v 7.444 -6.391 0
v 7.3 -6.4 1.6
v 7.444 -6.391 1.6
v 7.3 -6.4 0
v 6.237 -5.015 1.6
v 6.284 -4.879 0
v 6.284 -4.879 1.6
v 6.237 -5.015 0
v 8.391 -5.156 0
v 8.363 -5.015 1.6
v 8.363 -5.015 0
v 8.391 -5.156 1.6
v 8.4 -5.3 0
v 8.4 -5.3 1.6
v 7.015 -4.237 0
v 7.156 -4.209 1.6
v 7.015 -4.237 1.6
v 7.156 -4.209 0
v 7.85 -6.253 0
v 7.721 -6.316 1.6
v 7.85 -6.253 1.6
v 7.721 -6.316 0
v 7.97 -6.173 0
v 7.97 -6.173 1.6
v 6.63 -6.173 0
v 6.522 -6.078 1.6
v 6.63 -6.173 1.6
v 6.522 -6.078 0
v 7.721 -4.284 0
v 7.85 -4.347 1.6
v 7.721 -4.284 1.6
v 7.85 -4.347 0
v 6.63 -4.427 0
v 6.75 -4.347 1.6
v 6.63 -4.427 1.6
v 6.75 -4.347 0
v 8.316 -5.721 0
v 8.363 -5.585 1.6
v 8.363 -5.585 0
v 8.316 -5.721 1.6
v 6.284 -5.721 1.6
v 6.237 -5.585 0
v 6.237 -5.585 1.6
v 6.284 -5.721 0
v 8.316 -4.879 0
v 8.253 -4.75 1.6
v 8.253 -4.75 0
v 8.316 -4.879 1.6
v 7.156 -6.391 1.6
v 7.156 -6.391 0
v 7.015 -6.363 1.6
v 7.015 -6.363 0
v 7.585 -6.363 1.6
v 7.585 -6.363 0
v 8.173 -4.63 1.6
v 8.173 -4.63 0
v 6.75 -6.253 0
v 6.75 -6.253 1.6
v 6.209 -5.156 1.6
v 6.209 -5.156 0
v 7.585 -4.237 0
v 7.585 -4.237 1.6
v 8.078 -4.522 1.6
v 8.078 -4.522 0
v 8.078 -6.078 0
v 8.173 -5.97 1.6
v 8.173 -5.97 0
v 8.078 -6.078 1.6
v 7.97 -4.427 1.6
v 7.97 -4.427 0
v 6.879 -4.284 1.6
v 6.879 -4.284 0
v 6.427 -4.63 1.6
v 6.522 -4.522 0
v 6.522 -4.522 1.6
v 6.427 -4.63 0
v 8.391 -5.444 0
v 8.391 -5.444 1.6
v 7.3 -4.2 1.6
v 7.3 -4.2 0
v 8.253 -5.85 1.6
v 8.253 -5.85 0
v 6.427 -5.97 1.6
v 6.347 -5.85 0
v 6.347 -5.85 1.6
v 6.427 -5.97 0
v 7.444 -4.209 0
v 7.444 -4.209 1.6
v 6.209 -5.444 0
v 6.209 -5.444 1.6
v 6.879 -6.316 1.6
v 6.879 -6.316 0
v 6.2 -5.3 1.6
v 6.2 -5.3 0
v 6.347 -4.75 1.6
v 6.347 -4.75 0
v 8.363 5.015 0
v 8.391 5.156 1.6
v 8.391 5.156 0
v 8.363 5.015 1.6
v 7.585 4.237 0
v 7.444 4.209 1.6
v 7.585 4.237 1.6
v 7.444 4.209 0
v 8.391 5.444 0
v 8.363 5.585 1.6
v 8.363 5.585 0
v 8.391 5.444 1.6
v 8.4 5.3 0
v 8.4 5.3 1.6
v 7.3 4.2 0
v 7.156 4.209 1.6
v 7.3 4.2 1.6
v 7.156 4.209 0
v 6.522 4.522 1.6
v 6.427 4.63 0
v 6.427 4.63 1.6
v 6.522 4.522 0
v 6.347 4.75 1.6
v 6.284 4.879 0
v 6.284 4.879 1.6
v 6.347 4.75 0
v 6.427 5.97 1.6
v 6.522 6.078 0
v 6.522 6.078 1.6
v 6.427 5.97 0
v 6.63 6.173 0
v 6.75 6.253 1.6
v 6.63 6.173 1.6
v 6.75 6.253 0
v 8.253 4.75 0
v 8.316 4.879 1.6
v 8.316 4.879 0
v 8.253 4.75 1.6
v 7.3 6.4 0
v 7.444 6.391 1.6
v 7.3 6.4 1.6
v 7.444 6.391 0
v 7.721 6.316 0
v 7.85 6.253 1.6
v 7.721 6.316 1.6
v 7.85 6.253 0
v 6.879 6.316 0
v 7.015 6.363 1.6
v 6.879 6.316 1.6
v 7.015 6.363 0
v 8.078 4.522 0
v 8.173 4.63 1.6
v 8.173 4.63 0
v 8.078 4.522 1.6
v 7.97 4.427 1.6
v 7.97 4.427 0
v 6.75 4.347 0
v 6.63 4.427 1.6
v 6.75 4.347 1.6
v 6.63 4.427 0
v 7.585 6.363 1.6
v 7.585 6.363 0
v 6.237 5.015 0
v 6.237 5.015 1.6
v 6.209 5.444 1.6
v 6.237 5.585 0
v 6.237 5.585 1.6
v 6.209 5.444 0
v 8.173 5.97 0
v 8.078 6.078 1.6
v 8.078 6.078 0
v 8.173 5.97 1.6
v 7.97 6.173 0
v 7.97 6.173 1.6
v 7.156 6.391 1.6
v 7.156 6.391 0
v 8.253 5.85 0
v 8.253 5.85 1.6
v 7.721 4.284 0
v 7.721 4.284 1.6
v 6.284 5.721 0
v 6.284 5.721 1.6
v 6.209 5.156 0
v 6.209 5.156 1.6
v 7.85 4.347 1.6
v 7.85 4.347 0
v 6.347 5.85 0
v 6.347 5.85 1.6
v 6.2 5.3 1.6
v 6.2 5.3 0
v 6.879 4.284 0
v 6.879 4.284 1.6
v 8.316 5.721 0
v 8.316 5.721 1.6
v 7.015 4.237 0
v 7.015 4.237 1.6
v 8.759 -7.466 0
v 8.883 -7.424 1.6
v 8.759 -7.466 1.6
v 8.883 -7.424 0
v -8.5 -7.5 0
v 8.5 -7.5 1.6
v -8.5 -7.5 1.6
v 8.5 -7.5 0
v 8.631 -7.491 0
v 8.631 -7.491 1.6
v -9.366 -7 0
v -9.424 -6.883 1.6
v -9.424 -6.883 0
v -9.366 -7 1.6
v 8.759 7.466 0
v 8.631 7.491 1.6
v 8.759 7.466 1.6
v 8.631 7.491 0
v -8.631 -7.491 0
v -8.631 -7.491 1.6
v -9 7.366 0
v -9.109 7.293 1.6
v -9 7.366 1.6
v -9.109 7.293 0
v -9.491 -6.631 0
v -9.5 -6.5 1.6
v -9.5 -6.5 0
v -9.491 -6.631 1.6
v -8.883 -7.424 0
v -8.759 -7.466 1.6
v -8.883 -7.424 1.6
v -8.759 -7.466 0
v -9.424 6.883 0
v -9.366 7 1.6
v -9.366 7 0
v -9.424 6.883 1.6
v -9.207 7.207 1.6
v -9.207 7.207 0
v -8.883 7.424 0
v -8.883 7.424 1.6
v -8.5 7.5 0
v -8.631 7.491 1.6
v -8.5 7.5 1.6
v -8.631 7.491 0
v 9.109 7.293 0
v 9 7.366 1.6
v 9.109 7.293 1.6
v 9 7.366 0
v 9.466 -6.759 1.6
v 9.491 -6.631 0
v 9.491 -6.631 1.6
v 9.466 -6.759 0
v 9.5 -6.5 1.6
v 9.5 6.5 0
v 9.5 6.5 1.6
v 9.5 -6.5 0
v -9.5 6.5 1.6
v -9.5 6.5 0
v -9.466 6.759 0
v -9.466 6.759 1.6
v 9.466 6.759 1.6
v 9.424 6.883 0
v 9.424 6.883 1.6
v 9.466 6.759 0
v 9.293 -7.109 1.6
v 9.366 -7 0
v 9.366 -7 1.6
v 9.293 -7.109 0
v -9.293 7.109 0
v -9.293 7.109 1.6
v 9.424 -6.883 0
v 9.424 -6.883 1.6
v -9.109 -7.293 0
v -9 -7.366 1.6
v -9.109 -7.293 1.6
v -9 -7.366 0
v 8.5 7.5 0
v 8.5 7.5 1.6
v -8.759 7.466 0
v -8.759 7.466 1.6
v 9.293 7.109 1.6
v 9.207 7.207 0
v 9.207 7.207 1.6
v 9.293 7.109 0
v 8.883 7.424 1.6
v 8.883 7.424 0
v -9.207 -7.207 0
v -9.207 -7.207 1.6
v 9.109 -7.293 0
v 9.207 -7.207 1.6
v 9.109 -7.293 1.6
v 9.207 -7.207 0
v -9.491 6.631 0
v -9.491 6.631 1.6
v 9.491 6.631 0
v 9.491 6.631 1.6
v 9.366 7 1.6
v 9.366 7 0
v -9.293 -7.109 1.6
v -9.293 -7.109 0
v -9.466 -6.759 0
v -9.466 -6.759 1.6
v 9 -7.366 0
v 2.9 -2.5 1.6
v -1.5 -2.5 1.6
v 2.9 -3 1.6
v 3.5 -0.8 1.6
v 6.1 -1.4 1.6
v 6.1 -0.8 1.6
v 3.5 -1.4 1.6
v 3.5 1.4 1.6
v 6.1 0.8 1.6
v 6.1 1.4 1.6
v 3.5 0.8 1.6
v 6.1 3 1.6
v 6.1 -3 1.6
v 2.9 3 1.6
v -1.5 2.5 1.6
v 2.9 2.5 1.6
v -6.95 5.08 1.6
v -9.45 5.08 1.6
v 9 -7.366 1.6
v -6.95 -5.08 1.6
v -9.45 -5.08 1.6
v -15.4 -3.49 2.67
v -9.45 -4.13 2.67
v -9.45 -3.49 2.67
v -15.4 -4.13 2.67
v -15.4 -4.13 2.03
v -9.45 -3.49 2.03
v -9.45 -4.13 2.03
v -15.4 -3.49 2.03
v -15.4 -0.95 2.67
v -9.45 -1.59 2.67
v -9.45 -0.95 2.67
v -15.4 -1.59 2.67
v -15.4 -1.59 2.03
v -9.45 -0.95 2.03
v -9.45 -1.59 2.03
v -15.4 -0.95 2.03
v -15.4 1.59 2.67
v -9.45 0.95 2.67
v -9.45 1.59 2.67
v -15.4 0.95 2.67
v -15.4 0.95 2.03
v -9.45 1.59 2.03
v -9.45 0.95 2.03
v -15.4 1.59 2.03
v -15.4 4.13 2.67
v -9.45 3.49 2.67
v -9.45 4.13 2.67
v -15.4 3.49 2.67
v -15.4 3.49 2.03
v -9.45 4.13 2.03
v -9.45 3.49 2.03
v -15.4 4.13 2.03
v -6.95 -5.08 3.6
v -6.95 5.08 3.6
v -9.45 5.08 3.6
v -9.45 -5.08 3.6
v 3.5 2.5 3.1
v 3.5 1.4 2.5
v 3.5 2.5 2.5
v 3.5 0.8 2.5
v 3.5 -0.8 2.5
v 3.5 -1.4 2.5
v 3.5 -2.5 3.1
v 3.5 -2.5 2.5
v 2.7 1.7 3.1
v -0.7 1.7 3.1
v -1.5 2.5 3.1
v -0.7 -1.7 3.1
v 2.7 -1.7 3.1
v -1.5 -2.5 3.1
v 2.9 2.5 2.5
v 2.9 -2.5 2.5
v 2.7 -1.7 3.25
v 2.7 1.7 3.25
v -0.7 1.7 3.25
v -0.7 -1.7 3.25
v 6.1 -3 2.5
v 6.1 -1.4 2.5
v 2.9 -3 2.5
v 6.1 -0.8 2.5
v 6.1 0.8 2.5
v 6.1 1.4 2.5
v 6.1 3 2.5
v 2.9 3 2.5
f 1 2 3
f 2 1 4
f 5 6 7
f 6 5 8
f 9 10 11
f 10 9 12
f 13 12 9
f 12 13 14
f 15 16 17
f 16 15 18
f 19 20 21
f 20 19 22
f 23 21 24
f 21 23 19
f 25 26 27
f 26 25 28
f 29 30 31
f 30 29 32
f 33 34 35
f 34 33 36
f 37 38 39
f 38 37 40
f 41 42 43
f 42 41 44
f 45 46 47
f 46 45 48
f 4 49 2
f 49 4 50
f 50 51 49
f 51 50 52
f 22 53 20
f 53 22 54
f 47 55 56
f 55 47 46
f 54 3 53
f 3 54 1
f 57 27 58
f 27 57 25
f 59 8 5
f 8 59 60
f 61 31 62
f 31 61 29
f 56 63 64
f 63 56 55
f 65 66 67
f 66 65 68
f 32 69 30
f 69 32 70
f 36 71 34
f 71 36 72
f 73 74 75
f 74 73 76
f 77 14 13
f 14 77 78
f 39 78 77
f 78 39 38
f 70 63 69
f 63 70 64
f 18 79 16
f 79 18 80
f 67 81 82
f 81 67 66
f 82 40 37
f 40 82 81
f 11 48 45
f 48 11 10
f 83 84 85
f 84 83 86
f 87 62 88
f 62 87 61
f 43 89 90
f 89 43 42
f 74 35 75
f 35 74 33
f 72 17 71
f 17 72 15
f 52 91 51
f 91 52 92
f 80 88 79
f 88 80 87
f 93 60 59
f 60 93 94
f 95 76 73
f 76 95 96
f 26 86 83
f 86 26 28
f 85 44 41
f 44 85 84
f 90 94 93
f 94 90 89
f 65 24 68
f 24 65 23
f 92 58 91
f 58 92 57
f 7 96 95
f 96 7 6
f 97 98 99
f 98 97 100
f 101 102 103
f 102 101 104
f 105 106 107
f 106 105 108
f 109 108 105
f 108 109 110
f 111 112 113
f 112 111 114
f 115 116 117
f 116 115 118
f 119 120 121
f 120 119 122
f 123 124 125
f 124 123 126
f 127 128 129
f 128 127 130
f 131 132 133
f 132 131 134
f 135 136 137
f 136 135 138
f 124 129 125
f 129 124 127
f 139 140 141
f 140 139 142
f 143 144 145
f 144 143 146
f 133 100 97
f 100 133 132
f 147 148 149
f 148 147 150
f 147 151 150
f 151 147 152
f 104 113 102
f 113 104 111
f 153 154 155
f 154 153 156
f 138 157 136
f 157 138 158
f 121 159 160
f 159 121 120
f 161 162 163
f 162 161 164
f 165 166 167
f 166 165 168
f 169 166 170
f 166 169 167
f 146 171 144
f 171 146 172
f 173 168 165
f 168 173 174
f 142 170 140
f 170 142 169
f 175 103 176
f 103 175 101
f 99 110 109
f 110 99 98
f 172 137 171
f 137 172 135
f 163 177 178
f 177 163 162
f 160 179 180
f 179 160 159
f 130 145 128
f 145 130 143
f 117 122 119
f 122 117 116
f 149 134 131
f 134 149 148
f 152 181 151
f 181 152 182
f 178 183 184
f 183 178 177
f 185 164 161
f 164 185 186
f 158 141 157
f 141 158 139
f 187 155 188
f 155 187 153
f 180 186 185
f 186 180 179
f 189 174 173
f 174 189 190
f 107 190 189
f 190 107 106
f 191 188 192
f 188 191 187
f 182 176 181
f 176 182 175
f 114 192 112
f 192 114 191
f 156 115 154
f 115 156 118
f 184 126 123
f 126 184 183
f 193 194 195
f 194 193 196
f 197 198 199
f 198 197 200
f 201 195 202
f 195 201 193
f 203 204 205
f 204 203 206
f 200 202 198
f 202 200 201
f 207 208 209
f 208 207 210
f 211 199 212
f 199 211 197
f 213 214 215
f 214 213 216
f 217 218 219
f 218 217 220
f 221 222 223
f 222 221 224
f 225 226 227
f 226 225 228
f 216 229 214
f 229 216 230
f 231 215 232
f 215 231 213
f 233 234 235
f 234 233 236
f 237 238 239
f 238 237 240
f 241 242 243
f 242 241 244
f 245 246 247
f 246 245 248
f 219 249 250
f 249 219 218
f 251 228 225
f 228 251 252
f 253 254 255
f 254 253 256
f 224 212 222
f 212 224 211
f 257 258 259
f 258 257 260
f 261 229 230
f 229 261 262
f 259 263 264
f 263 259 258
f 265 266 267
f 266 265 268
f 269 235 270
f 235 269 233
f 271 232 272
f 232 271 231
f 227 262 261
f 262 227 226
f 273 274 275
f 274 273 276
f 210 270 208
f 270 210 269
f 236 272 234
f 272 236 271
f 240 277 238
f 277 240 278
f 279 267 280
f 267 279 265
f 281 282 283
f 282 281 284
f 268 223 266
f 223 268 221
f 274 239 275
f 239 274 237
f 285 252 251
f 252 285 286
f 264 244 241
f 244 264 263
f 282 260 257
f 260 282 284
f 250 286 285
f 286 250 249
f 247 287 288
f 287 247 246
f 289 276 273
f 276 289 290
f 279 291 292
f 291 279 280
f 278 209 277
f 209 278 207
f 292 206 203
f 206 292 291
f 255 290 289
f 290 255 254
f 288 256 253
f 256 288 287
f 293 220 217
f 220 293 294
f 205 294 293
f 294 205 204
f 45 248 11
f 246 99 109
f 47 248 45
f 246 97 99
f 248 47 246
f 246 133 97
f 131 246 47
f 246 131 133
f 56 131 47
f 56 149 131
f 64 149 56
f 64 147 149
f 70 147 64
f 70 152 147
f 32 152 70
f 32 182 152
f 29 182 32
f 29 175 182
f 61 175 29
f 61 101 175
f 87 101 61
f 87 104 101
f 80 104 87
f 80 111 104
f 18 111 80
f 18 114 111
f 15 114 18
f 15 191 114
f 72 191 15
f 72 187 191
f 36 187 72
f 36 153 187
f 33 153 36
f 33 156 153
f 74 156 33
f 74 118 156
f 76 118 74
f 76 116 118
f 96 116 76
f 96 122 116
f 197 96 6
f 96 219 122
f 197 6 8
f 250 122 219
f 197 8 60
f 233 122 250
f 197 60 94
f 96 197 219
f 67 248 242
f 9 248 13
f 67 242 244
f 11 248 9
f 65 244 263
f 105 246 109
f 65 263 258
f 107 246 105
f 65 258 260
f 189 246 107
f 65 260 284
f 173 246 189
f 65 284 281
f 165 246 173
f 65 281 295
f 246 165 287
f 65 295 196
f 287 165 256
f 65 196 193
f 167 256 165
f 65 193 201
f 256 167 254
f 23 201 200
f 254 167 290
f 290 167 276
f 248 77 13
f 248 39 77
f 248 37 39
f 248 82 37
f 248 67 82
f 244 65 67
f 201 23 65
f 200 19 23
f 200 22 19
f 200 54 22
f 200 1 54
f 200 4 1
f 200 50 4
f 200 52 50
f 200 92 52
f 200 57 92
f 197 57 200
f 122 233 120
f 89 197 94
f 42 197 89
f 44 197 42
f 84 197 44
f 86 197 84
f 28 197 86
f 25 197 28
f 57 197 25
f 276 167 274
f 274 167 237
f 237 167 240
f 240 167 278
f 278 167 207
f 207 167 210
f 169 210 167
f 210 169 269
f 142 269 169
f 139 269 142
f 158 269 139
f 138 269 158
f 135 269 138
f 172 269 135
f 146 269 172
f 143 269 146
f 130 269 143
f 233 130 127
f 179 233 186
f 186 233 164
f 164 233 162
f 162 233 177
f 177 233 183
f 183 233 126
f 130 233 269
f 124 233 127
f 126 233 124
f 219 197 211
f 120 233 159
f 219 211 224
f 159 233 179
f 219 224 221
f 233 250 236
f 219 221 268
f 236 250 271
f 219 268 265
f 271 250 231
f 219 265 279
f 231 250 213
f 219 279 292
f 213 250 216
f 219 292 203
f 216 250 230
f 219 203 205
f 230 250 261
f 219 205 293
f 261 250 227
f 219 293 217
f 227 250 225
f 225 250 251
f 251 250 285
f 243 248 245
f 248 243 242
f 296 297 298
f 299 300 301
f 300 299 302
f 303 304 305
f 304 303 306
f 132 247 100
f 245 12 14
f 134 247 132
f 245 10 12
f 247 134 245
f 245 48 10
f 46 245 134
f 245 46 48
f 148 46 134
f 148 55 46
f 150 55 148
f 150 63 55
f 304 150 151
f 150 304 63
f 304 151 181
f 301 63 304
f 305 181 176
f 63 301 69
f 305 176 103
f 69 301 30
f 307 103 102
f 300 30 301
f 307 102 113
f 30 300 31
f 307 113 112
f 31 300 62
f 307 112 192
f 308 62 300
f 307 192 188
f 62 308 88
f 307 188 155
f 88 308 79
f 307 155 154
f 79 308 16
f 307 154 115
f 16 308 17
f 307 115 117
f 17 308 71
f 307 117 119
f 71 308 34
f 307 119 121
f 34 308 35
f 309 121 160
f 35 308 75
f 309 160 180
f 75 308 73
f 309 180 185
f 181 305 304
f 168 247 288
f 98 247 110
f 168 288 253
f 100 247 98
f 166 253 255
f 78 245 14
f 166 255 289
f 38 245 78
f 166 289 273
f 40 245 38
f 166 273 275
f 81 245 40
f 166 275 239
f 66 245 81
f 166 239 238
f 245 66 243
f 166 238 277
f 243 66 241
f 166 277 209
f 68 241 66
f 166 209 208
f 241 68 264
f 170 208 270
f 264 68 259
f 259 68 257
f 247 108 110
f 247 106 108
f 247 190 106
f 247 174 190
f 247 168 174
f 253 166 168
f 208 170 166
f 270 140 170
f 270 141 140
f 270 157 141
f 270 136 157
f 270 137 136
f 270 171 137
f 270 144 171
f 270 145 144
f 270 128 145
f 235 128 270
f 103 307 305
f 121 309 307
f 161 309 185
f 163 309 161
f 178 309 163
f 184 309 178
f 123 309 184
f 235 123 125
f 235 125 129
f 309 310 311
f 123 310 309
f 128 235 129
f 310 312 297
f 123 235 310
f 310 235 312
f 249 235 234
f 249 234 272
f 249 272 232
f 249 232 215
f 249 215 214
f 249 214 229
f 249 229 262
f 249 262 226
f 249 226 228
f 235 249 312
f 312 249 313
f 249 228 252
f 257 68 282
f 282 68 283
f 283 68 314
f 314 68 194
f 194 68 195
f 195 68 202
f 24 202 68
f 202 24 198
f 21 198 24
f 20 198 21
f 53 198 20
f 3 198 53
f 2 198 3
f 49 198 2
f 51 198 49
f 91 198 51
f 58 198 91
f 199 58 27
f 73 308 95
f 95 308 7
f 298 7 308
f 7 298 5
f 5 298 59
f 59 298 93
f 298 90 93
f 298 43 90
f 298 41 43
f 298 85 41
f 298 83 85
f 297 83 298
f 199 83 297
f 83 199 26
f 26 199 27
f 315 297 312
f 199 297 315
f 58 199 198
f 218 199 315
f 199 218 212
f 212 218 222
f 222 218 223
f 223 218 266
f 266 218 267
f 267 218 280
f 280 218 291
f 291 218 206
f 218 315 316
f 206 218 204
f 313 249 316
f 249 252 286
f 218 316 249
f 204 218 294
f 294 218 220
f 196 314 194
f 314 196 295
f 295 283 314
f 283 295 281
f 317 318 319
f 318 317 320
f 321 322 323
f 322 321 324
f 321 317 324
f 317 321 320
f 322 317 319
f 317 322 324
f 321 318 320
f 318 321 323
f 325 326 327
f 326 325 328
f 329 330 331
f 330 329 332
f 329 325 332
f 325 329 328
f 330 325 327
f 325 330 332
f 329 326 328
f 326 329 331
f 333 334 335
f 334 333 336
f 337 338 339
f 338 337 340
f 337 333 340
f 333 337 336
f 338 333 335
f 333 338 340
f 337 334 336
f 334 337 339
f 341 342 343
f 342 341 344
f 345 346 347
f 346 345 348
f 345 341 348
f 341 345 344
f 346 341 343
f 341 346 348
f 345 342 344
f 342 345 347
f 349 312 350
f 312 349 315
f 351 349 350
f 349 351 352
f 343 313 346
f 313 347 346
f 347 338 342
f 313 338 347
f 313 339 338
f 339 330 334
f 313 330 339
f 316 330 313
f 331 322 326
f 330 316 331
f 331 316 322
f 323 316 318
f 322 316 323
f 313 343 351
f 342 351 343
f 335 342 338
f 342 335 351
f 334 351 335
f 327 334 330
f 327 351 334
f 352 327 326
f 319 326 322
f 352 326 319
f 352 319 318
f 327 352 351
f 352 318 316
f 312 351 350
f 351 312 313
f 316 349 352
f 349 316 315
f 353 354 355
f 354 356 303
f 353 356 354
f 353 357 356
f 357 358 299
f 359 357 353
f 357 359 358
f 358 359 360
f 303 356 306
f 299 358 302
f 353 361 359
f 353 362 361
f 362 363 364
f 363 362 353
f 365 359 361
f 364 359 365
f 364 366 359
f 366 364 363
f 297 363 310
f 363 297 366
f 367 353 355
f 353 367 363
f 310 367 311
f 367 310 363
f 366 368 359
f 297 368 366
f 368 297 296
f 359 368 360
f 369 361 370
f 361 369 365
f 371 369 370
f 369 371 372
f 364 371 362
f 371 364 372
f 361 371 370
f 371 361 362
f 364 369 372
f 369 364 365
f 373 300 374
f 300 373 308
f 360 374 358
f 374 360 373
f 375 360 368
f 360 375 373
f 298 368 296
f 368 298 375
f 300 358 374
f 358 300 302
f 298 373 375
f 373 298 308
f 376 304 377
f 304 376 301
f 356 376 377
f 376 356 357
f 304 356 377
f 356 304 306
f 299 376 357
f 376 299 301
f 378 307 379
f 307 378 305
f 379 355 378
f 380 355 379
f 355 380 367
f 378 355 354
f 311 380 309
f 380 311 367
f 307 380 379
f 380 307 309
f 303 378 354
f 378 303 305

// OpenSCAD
// file: _led-module-common.scad
// Parametric envelope models for EC Buying LED breakout boards.
// Units: millimetres. Origin: PCB centre, bottom face at Z=0.

$fn = 48;

module rounded_board(length, width, thickness=1.6, radius=1.0) {
    color([0.025, 0.03, 0.03])
        linear_extrude(height=thickness)
            offset(r=radius)
                square([length-2*radius, width-2*radius], center=true);
}

module board_with_holes(length, width, hole_diameter=2.2) {
    difference() {
        rounded_board(length, width);
        for (y=[-width/2+2.2, width/2-2.2])
            translate([length/2-2.2, y, -0.1])
                cylinder(h=1.8, d=hole_diameter);
    }
}

module right_angle_header(pin_count, board_length, pitch=2.54) {
    // Plastic carrier and 0.64 mm square pins extending from the PCB edge.
    color([0.035, 0.035, 0.035])
        translate([-board_length/2+1.3, 0, 2.35])
            cube([2.5, pin_count*pitch, 2.5], center=true);
    color([0.72, 0.72, 0.68])
        for (i=[0:pin_count-1]) {
            y=(i-(pin_count-1)/2)*pitch;
            translate([-board_length/2-2.3, y, 2.35])
                cube([7.2, 0.64, 0.64], center=true);
        }
}

module smd_5050() {
    color([0.92, 0.92, 0.86])
        translate([1.0, 0, 2.35]) cube([5.0, 5.0, 1.5], center=true);
    color([0.78, 0.82, 0.76])
        translate([1.0, 0, 3.15]) cube([3.4, 3.4, 0.2], center=true);
}

module vertical_f5_led() {
    color([0.88, 0.90, 0.88, 0.72]) {
        translate([1.5, 0, 1.6]) cylinder(h=6.3, d=5.0);
        translate([1.5, 0, 7.9]) sphere(d=5.0);
    }
}

module horizontal_f5_led(board_length) {
    color([0.88, 0.90, 0.88, 0.72]) {
        translate([board_length/2-0.4, 0, 3.2])
            rotate([0, 90, 0]) cylinder(h=6.2, d=5.0);
        translate([board_length/2+5.8, 0, 3.2]) sphere(d=5.0);
    }
}

module small_resistor(position=[0,0,0]) {
    color([0.2, 0.2, 0.2])
        translate(position) cube([3.2, 1.6, 0.9], center=true);
}

module led_module(
    board_length=19,
    board_width=15,
    pin_count=4,
    led_style="smd",
    resistor_count=3
) {
    board_with_holes(board_length, board_width);
    right_angle_header(pin_count, board_length);

    if (led_style == "smd") smd_5050();
    else if (led_style == "vertical") vertical_f5_led();
    else if (led_style == "horizontal") horizontal_f5_led(board_length);

    for (i=[0:resistor_count-1])
        small_resistor([board_length/2-5.0, (i-(resistor_count-1)/2)*2.2, 2.05]);
}
// main file
use <_led-module-common.scad>

// Listing dimension: 19 x 15 mm PCB; 5050 SMD RGB LED and four pins.
led_module(
    board_length=19,
    board_width=15,
    pin_count=4,
    led_style="smd",
    resistor_count=3
);
